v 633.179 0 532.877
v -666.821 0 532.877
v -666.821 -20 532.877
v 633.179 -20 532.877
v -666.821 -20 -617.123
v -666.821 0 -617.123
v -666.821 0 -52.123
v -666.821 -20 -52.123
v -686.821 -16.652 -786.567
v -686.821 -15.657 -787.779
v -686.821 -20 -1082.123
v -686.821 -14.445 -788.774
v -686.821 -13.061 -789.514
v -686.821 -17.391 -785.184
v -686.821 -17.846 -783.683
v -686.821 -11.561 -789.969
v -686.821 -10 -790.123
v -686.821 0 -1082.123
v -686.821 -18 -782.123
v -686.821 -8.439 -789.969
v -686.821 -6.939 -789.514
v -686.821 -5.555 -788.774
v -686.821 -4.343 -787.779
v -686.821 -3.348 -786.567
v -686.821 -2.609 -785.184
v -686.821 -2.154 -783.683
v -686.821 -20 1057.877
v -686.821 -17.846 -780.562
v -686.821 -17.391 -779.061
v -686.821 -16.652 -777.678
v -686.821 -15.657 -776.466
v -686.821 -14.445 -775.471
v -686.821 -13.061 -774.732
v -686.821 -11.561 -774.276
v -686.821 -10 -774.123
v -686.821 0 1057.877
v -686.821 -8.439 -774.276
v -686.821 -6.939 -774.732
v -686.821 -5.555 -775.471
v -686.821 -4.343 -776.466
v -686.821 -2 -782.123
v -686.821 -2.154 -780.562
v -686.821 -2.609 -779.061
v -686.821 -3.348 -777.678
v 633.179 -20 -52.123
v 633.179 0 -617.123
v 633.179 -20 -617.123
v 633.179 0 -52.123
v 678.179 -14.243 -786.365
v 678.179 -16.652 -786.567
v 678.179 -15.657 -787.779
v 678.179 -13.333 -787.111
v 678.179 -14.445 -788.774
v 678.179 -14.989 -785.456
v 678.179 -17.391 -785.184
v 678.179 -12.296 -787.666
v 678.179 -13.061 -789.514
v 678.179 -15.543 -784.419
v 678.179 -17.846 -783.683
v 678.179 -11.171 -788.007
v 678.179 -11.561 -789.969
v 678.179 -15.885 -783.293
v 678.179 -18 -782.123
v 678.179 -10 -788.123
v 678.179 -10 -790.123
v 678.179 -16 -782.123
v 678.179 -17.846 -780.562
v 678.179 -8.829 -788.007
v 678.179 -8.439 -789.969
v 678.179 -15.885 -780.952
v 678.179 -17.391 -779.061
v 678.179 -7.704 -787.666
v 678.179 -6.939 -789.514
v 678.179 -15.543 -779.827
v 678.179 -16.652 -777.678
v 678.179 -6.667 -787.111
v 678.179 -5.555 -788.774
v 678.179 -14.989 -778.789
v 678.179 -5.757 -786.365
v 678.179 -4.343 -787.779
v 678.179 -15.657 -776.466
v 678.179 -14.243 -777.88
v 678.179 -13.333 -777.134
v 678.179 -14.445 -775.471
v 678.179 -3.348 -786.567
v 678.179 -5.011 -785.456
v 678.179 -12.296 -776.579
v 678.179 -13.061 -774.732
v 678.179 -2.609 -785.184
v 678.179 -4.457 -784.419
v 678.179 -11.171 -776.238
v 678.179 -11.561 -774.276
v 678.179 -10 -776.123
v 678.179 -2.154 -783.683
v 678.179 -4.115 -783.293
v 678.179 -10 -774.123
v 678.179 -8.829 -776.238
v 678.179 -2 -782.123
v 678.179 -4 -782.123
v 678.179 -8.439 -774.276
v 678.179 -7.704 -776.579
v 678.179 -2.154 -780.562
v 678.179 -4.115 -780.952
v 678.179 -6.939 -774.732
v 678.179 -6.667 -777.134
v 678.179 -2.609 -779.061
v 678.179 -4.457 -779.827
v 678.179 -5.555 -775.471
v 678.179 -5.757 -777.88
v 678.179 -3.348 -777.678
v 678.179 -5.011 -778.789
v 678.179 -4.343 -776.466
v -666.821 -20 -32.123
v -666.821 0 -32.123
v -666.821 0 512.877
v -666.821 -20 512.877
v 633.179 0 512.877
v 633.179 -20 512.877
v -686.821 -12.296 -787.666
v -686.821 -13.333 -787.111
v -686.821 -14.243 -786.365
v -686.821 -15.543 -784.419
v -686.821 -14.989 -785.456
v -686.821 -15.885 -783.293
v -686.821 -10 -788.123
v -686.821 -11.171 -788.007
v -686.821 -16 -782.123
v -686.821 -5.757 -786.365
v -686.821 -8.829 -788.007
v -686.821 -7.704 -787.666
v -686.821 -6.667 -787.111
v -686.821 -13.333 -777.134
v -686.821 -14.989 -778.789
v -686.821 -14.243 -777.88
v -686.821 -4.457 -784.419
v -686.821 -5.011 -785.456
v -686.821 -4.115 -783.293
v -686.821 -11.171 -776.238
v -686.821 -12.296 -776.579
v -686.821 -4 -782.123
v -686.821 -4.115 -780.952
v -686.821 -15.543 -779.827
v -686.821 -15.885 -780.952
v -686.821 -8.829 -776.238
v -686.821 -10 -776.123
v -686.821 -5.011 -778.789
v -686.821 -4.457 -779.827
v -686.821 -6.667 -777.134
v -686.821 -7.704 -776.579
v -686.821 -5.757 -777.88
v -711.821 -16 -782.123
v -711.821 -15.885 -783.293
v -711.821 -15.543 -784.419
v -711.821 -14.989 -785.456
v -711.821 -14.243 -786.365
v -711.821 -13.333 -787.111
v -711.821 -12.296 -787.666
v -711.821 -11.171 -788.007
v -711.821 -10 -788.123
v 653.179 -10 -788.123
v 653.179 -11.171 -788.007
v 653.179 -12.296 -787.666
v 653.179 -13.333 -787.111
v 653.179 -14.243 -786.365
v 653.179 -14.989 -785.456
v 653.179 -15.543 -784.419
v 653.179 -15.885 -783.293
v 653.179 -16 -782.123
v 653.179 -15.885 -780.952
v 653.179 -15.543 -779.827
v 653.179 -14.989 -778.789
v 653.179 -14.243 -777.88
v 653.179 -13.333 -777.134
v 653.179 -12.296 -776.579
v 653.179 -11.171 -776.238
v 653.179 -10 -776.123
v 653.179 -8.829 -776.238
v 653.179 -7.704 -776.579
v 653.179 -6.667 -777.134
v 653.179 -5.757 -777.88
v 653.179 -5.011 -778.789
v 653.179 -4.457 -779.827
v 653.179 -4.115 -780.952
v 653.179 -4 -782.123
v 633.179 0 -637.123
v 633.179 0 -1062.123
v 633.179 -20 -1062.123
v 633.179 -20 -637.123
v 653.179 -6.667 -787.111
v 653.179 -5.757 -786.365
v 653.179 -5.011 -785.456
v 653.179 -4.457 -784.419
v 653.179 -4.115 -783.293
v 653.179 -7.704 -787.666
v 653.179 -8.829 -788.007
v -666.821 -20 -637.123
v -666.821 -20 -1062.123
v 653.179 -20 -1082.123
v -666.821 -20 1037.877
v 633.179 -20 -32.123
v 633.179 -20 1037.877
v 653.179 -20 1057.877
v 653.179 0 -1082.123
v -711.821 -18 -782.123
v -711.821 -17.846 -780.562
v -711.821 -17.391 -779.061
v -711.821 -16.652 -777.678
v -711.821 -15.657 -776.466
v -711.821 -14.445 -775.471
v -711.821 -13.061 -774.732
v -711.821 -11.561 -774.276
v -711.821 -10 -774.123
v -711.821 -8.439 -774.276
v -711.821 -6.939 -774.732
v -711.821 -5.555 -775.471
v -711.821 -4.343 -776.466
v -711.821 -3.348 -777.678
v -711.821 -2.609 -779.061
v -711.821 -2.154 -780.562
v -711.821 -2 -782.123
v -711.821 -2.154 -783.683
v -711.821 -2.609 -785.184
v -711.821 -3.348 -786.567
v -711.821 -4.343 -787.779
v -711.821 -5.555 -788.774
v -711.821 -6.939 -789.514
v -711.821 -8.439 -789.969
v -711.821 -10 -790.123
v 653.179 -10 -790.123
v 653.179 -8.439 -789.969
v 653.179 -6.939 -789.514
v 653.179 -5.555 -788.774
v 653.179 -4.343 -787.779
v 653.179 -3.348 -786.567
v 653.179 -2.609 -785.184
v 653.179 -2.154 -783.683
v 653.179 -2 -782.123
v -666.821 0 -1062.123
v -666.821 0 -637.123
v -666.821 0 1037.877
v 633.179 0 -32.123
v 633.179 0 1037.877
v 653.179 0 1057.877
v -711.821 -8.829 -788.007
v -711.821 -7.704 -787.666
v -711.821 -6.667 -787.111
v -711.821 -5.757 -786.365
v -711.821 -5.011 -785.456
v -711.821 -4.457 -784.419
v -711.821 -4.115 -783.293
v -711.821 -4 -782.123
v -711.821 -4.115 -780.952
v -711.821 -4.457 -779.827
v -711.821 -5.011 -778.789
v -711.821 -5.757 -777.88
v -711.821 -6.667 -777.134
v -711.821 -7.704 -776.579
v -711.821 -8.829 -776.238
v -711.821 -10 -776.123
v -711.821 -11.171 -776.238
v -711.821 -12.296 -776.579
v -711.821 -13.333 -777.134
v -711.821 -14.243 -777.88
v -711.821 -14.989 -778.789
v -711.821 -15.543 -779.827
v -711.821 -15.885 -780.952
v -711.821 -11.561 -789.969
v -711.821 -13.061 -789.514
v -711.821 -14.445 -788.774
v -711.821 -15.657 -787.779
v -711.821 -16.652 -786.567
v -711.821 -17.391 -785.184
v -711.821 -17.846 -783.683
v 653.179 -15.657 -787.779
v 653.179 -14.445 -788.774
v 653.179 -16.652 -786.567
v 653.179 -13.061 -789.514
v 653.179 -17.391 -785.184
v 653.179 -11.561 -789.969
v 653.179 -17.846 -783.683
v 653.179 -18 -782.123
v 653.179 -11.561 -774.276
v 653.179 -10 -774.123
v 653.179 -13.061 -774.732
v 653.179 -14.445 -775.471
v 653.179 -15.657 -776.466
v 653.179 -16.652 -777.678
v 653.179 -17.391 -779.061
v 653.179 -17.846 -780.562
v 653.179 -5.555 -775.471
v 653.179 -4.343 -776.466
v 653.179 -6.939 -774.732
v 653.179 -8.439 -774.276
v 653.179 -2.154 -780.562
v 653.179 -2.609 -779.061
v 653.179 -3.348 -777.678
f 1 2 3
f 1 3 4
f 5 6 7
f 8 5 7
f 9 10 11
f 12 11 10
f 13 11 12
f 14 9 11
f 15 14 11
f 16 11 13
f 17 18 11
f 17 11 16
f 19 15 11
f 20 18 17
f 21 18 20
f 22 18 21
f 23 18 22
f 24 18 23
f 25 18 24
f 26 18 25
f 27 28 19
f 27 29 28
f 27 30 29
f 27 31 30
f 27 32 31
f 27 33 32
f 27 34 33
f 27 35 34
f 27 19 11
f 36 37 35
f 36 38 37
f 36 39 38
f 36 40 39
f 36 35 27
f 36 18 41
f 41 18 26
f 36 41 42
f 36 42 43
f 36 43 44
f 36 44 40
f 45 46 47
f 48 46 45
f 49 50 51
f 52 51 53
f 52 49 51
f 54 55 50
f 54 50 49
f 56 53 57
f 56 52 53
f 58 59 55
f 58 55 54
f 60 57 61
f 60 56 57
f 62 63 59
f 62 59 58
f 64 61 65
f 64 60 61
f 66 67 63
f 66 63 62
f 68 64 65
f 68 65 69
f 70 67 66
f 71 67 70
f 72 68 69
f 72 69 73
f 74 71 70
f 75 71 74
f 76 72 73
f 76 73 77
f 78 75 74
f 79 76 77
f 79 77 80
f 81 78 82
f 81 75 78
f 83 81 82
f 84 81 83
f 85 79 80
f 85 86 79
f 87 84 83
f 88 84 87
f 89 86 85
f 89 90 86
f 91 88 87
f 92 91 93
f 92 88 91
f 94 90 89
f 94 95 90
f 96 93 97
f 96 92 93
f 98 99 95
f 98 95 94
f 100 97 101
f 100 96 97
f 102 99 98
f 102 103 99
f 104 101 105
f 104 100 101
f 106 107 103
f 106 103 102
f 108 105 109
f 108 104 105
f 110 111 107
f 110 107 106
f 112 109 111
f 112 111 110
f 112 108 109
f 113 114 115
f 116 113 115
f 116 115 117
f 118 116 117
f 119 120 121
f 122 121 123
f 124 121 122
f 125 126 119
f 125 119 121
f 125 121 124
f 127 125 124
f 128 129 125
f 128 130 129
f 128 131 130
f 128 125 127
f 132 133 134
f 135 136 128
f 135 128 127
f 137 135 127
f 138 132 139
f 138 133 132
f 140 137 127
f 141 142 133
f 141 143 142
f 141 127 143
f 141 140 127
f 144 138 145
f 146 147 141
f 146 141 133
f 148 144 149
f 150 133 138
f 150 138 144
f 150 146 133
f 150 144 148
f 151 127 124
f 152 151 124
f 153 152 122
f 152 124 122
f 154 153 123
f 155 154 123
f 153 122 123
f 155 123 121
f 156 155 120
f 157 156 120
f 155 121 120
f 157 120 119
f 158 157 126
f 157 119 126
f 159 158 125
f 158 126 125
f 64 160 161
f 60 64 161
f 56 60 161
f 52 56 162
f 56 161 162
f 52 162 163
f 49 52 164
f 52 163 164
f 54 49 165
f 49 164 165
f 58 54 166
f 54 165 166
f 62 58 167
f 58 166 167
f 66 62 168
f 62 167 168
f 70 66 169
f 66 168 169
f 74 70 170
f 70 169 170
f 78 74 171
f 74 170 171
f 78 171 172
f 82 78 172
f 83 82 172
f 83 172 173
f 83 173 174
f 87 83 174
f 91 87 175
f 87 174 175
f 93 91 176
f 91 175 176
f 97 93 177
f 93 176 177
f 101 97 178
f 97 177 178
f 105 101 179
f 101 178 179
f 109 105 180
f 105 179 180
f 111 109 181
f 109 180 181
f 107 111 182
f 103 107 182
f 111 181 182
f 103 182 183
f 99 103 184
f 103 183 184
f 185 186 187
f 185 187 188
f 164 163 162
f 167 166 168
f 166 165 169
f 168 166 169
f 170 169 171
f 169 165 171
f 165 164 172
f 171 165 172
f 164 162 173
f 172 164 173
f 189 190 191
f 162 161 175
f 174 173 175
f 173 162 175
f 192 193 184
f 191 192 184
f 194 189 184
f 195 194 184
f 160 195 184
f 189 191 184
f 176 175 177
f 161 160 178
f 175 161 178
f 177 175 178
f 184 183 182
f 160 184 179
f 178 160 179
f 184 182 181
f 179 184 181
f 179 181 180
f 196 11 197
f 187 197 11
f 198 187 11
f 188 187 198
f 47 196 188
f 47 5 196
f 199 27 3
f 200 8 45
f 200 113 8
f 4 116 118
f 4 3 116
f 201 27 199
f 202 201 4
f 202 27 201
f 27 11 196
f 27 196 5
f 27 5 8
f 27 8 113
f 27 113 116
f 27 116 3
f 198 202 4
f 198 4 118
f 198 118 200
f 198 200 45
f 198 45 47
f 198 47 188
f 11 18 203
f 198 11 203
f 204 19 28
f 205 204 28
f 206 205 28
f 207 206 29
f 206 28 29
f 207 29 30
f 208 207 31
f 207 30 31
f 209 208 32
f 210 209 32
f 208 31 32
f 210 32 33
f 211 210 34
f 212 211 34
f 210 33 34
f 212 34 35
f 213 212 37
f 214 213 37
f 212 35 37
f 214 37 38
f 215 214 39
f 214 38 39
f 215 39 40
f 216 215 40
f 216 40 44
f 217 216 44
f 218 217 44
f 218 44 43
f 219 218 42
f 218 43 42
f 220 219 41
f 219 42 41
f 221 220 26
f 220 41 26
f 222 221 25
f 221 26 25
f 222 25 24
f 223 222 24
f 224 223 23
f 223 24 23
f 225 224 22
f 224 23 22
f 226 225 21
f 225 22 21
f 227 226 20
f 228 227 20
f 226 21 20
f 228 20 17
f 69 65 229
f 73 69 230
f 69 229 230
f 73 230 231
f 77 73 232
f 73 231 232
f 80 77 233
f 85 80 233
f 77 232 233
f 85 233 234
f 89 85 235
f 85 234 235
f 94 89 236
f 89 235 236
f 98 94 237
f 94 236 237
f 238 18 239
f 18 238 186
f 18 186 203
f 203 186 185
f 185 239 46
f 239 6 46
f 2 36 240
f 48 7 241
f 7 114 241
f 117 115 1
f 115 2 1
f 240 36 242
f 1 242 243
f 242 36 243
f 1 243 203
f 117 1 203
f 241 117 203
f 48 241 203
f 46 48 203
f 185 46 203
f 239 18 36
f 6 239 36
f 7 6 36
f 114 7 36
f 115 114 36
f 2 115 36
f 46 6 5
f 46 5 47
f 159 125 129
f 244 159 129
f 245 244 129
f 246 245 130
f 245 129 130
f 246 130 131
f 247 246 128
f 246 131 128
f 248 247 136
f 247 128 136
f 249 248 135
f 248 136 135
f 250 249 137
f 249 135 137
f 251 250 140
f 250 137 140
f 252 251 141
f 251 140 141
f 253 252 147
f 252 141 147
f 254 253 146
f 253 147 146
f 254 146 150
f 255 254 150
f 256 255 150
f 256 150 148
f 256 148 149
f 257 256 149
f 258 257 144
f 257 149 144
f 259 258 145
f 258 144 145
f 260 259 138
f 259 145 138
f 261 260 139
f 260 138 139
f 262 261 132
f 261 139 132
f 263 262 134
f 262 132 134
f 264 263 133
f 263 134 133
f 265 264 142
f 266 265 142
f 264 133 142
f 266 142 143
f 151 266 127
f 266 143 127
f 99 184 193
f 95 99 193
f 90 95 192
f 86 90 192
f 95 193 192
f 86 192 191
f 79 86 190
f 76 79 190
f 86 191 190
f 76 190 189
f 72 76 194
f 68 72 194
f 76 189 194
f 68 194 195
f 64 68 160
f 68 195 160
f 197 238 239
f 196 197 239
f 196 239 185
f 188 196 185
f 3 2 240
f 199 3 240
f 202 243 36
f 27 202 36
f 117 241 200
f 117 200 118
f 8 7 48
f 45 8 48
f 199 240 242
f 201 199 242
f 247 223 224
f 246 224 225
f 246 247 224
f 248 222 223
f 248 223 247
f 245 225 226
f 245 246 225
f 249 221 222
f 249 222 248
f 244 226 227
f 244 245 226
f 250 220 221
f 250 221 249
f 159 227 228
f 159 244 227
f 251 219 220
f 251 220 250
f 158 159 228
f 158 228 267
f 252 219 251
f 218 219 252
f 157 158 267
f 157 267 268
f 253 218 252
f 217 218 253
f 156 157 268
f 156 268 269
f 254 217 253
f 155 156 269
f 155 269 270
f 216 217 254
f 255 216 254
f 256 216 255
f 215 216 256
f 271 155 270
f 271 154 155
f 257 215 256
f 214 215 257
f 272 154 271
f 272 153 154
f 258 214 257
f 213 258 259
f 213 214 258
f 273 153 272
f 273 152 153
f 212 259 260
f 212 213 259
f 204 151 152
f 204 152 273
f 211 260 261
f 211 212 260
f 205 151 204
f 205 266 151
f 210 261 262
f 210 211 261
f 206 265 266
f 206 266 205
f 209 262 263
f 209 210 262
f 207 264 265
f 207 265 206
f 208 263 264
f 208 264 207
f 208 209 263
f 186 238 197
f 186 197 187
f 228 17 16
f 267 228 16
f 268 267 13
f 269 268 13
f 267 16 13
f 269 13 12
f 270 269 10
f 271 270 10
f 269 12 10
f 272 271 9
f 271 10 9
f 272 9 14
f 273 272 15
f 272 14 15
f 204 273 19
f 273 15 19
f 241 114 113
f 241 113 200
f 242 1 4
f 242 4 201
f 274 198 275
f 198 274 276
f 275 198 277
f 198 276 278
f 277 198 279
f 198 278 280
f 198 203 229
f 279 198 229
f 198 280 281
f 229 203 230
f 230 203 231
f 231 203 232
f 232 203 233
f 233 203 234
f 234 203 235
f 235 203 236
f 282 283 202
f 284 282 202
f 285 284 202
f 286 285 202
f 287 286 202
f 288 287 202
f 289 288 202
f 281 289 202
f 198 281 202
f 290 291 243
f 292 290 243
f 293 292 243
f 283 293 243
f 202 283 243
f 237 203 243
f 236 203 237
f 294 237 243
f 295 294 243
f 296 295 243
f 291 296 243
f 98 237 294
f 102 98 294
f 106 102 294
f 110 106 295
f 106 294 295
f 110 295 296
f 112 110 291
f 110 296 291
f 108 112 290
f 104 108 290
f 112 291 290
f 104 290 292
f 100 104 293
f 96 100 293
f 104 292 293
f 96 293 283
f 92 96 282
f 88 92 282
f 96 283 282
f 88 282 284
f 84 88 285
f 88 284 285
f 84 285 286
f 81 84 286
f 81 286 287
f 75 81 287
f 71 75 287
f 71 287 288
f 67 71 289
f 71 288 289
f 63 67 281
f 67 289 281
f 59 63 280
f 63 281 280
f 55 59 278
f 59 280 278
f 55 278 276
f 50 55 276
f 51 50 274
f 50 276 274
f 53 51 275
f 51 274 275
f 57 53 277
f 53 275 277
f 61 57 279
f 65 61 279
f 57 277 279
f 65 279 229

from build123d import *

# Parameters (mm, degrees)
F0_W     = 20
F0_H     = 20
F0_H_2   = 2100
F0_W_2   = 1300
F1_DEPTH = 20
F2_W     = 1340
F2_H     = 20
F3_DEPTH = 20
F5_DEPTH = 25
F7_DEPTH = 25


with BuildPart() as f1:
    # F0 (on Front) → F1 (new body)
    with BuildSketch(Plane.XZ):
        with Locations((-676.821301, 1047.877386)):
            Rectangle(F0_W, F0_H)
        with Locations((-676.821301, -12.122614)):
            Rectangle(F0_W, F0_H_2)
        with Locations((-16.821301, 1047.877386)):
            Rectangle(F0_W_2, F0_H)
        with Locations((-676.821301, -1072.122614)):
            Rectangle(F0_W, F0_H)
        with Locations((643.178699, 1047.877386)):
            Rectangle(F0_W, F0_H)
        with Locations((643.178699, -12.122614)):
            Rectangle(F0_W, F0_H_2)
        with Locations((-16.821301, -1072.122614)):
            Rectangle(F0_W_2, F0_H)
        with Locations((643.178699, -1072.122614)):
            Rectangle(F0_W, F0_H)
    extrude(amount=F1_DEPTH)

    # F2 (on Front) → F3 (join)
    with BuildSketch(Plane.XZ):
        with Locations((-16.821301, 522.877386)):
            Rectangle(F2_W, F2_H)
        with Locations((-16.821301, -42.122614)):
            Rectangle(F2_W, F2_H)
        with Locations((-16.821301, -627.122614)):
            Rectangle(F2_W, F2_H)
    extrude(amount=F3_DEPTH)

    # F4 (on face) → F5 (join)
    with BuildSketch(Plane(origin=(-686.821301, 0, 0), x_dir=(0, -1, 0), z_dir=(-1, 0, 0))):
        with BuildLine():
            ThreePointArc((16, -782.122614), (5.757359, -777.879974), (10, -788.122614))
            ThreePointArc((10, -788.122614), (14.242641, -786.365255), (16, -782.122614))
        make_face()
        with BuildLine():
            ThreePointArc((18, -782.122614), (4.343146, -776.46576), (10, -790.122614))
            ThreePointArc((10, -790.122614), (15.656854, -787.779469), (18, -782.122614))
        make_face()
        with BuildLine():
            ThreePointArc((16, -782.122614), (14.242641, -786.365255), (10, -788.122614))
            ThreePointArc((10, -788.122614), (5.757359, -777.879974), (16, -782.122614))
        make_face(mode=Mode.SUBTRACT)
    extrude(amount=F5_DEPTH)

    # F6 (on face) → F7 (join)
    with BuildSketch(Plane.YZ.offset(653.178699)):
        with BuildLine():
            ThreePointArc((-4, -782.122614), (-14.242641, -777.879974), (-10, -788.122614))
            ThreePointArc((-10, -788.122614), (-5.757359, -786.365255), (-4, -782.122614))
        make_face()
        with BuildLine():
            ThreePointArc((-2, -782.122614), (-15.656854, -776.46576), (-10, -790.122614))
            ThreePointArc((-10, -790.122614), (-4.343146, -787.779469), (-2, -782.122614))
        make_face()
        with BuildLine():
            ThreePointArc((-4, -782.122614), (-5.757359, -786.365255), (-10, -788.122614))
            ThreePointArc((-10, -788.122614), (-14.242641, -777.879974), (-4, -782.122614))
        make_face(mode=Mode.SUBTRACT)
    extrude(amount=F7_DEPTH)


solid = f1.part
